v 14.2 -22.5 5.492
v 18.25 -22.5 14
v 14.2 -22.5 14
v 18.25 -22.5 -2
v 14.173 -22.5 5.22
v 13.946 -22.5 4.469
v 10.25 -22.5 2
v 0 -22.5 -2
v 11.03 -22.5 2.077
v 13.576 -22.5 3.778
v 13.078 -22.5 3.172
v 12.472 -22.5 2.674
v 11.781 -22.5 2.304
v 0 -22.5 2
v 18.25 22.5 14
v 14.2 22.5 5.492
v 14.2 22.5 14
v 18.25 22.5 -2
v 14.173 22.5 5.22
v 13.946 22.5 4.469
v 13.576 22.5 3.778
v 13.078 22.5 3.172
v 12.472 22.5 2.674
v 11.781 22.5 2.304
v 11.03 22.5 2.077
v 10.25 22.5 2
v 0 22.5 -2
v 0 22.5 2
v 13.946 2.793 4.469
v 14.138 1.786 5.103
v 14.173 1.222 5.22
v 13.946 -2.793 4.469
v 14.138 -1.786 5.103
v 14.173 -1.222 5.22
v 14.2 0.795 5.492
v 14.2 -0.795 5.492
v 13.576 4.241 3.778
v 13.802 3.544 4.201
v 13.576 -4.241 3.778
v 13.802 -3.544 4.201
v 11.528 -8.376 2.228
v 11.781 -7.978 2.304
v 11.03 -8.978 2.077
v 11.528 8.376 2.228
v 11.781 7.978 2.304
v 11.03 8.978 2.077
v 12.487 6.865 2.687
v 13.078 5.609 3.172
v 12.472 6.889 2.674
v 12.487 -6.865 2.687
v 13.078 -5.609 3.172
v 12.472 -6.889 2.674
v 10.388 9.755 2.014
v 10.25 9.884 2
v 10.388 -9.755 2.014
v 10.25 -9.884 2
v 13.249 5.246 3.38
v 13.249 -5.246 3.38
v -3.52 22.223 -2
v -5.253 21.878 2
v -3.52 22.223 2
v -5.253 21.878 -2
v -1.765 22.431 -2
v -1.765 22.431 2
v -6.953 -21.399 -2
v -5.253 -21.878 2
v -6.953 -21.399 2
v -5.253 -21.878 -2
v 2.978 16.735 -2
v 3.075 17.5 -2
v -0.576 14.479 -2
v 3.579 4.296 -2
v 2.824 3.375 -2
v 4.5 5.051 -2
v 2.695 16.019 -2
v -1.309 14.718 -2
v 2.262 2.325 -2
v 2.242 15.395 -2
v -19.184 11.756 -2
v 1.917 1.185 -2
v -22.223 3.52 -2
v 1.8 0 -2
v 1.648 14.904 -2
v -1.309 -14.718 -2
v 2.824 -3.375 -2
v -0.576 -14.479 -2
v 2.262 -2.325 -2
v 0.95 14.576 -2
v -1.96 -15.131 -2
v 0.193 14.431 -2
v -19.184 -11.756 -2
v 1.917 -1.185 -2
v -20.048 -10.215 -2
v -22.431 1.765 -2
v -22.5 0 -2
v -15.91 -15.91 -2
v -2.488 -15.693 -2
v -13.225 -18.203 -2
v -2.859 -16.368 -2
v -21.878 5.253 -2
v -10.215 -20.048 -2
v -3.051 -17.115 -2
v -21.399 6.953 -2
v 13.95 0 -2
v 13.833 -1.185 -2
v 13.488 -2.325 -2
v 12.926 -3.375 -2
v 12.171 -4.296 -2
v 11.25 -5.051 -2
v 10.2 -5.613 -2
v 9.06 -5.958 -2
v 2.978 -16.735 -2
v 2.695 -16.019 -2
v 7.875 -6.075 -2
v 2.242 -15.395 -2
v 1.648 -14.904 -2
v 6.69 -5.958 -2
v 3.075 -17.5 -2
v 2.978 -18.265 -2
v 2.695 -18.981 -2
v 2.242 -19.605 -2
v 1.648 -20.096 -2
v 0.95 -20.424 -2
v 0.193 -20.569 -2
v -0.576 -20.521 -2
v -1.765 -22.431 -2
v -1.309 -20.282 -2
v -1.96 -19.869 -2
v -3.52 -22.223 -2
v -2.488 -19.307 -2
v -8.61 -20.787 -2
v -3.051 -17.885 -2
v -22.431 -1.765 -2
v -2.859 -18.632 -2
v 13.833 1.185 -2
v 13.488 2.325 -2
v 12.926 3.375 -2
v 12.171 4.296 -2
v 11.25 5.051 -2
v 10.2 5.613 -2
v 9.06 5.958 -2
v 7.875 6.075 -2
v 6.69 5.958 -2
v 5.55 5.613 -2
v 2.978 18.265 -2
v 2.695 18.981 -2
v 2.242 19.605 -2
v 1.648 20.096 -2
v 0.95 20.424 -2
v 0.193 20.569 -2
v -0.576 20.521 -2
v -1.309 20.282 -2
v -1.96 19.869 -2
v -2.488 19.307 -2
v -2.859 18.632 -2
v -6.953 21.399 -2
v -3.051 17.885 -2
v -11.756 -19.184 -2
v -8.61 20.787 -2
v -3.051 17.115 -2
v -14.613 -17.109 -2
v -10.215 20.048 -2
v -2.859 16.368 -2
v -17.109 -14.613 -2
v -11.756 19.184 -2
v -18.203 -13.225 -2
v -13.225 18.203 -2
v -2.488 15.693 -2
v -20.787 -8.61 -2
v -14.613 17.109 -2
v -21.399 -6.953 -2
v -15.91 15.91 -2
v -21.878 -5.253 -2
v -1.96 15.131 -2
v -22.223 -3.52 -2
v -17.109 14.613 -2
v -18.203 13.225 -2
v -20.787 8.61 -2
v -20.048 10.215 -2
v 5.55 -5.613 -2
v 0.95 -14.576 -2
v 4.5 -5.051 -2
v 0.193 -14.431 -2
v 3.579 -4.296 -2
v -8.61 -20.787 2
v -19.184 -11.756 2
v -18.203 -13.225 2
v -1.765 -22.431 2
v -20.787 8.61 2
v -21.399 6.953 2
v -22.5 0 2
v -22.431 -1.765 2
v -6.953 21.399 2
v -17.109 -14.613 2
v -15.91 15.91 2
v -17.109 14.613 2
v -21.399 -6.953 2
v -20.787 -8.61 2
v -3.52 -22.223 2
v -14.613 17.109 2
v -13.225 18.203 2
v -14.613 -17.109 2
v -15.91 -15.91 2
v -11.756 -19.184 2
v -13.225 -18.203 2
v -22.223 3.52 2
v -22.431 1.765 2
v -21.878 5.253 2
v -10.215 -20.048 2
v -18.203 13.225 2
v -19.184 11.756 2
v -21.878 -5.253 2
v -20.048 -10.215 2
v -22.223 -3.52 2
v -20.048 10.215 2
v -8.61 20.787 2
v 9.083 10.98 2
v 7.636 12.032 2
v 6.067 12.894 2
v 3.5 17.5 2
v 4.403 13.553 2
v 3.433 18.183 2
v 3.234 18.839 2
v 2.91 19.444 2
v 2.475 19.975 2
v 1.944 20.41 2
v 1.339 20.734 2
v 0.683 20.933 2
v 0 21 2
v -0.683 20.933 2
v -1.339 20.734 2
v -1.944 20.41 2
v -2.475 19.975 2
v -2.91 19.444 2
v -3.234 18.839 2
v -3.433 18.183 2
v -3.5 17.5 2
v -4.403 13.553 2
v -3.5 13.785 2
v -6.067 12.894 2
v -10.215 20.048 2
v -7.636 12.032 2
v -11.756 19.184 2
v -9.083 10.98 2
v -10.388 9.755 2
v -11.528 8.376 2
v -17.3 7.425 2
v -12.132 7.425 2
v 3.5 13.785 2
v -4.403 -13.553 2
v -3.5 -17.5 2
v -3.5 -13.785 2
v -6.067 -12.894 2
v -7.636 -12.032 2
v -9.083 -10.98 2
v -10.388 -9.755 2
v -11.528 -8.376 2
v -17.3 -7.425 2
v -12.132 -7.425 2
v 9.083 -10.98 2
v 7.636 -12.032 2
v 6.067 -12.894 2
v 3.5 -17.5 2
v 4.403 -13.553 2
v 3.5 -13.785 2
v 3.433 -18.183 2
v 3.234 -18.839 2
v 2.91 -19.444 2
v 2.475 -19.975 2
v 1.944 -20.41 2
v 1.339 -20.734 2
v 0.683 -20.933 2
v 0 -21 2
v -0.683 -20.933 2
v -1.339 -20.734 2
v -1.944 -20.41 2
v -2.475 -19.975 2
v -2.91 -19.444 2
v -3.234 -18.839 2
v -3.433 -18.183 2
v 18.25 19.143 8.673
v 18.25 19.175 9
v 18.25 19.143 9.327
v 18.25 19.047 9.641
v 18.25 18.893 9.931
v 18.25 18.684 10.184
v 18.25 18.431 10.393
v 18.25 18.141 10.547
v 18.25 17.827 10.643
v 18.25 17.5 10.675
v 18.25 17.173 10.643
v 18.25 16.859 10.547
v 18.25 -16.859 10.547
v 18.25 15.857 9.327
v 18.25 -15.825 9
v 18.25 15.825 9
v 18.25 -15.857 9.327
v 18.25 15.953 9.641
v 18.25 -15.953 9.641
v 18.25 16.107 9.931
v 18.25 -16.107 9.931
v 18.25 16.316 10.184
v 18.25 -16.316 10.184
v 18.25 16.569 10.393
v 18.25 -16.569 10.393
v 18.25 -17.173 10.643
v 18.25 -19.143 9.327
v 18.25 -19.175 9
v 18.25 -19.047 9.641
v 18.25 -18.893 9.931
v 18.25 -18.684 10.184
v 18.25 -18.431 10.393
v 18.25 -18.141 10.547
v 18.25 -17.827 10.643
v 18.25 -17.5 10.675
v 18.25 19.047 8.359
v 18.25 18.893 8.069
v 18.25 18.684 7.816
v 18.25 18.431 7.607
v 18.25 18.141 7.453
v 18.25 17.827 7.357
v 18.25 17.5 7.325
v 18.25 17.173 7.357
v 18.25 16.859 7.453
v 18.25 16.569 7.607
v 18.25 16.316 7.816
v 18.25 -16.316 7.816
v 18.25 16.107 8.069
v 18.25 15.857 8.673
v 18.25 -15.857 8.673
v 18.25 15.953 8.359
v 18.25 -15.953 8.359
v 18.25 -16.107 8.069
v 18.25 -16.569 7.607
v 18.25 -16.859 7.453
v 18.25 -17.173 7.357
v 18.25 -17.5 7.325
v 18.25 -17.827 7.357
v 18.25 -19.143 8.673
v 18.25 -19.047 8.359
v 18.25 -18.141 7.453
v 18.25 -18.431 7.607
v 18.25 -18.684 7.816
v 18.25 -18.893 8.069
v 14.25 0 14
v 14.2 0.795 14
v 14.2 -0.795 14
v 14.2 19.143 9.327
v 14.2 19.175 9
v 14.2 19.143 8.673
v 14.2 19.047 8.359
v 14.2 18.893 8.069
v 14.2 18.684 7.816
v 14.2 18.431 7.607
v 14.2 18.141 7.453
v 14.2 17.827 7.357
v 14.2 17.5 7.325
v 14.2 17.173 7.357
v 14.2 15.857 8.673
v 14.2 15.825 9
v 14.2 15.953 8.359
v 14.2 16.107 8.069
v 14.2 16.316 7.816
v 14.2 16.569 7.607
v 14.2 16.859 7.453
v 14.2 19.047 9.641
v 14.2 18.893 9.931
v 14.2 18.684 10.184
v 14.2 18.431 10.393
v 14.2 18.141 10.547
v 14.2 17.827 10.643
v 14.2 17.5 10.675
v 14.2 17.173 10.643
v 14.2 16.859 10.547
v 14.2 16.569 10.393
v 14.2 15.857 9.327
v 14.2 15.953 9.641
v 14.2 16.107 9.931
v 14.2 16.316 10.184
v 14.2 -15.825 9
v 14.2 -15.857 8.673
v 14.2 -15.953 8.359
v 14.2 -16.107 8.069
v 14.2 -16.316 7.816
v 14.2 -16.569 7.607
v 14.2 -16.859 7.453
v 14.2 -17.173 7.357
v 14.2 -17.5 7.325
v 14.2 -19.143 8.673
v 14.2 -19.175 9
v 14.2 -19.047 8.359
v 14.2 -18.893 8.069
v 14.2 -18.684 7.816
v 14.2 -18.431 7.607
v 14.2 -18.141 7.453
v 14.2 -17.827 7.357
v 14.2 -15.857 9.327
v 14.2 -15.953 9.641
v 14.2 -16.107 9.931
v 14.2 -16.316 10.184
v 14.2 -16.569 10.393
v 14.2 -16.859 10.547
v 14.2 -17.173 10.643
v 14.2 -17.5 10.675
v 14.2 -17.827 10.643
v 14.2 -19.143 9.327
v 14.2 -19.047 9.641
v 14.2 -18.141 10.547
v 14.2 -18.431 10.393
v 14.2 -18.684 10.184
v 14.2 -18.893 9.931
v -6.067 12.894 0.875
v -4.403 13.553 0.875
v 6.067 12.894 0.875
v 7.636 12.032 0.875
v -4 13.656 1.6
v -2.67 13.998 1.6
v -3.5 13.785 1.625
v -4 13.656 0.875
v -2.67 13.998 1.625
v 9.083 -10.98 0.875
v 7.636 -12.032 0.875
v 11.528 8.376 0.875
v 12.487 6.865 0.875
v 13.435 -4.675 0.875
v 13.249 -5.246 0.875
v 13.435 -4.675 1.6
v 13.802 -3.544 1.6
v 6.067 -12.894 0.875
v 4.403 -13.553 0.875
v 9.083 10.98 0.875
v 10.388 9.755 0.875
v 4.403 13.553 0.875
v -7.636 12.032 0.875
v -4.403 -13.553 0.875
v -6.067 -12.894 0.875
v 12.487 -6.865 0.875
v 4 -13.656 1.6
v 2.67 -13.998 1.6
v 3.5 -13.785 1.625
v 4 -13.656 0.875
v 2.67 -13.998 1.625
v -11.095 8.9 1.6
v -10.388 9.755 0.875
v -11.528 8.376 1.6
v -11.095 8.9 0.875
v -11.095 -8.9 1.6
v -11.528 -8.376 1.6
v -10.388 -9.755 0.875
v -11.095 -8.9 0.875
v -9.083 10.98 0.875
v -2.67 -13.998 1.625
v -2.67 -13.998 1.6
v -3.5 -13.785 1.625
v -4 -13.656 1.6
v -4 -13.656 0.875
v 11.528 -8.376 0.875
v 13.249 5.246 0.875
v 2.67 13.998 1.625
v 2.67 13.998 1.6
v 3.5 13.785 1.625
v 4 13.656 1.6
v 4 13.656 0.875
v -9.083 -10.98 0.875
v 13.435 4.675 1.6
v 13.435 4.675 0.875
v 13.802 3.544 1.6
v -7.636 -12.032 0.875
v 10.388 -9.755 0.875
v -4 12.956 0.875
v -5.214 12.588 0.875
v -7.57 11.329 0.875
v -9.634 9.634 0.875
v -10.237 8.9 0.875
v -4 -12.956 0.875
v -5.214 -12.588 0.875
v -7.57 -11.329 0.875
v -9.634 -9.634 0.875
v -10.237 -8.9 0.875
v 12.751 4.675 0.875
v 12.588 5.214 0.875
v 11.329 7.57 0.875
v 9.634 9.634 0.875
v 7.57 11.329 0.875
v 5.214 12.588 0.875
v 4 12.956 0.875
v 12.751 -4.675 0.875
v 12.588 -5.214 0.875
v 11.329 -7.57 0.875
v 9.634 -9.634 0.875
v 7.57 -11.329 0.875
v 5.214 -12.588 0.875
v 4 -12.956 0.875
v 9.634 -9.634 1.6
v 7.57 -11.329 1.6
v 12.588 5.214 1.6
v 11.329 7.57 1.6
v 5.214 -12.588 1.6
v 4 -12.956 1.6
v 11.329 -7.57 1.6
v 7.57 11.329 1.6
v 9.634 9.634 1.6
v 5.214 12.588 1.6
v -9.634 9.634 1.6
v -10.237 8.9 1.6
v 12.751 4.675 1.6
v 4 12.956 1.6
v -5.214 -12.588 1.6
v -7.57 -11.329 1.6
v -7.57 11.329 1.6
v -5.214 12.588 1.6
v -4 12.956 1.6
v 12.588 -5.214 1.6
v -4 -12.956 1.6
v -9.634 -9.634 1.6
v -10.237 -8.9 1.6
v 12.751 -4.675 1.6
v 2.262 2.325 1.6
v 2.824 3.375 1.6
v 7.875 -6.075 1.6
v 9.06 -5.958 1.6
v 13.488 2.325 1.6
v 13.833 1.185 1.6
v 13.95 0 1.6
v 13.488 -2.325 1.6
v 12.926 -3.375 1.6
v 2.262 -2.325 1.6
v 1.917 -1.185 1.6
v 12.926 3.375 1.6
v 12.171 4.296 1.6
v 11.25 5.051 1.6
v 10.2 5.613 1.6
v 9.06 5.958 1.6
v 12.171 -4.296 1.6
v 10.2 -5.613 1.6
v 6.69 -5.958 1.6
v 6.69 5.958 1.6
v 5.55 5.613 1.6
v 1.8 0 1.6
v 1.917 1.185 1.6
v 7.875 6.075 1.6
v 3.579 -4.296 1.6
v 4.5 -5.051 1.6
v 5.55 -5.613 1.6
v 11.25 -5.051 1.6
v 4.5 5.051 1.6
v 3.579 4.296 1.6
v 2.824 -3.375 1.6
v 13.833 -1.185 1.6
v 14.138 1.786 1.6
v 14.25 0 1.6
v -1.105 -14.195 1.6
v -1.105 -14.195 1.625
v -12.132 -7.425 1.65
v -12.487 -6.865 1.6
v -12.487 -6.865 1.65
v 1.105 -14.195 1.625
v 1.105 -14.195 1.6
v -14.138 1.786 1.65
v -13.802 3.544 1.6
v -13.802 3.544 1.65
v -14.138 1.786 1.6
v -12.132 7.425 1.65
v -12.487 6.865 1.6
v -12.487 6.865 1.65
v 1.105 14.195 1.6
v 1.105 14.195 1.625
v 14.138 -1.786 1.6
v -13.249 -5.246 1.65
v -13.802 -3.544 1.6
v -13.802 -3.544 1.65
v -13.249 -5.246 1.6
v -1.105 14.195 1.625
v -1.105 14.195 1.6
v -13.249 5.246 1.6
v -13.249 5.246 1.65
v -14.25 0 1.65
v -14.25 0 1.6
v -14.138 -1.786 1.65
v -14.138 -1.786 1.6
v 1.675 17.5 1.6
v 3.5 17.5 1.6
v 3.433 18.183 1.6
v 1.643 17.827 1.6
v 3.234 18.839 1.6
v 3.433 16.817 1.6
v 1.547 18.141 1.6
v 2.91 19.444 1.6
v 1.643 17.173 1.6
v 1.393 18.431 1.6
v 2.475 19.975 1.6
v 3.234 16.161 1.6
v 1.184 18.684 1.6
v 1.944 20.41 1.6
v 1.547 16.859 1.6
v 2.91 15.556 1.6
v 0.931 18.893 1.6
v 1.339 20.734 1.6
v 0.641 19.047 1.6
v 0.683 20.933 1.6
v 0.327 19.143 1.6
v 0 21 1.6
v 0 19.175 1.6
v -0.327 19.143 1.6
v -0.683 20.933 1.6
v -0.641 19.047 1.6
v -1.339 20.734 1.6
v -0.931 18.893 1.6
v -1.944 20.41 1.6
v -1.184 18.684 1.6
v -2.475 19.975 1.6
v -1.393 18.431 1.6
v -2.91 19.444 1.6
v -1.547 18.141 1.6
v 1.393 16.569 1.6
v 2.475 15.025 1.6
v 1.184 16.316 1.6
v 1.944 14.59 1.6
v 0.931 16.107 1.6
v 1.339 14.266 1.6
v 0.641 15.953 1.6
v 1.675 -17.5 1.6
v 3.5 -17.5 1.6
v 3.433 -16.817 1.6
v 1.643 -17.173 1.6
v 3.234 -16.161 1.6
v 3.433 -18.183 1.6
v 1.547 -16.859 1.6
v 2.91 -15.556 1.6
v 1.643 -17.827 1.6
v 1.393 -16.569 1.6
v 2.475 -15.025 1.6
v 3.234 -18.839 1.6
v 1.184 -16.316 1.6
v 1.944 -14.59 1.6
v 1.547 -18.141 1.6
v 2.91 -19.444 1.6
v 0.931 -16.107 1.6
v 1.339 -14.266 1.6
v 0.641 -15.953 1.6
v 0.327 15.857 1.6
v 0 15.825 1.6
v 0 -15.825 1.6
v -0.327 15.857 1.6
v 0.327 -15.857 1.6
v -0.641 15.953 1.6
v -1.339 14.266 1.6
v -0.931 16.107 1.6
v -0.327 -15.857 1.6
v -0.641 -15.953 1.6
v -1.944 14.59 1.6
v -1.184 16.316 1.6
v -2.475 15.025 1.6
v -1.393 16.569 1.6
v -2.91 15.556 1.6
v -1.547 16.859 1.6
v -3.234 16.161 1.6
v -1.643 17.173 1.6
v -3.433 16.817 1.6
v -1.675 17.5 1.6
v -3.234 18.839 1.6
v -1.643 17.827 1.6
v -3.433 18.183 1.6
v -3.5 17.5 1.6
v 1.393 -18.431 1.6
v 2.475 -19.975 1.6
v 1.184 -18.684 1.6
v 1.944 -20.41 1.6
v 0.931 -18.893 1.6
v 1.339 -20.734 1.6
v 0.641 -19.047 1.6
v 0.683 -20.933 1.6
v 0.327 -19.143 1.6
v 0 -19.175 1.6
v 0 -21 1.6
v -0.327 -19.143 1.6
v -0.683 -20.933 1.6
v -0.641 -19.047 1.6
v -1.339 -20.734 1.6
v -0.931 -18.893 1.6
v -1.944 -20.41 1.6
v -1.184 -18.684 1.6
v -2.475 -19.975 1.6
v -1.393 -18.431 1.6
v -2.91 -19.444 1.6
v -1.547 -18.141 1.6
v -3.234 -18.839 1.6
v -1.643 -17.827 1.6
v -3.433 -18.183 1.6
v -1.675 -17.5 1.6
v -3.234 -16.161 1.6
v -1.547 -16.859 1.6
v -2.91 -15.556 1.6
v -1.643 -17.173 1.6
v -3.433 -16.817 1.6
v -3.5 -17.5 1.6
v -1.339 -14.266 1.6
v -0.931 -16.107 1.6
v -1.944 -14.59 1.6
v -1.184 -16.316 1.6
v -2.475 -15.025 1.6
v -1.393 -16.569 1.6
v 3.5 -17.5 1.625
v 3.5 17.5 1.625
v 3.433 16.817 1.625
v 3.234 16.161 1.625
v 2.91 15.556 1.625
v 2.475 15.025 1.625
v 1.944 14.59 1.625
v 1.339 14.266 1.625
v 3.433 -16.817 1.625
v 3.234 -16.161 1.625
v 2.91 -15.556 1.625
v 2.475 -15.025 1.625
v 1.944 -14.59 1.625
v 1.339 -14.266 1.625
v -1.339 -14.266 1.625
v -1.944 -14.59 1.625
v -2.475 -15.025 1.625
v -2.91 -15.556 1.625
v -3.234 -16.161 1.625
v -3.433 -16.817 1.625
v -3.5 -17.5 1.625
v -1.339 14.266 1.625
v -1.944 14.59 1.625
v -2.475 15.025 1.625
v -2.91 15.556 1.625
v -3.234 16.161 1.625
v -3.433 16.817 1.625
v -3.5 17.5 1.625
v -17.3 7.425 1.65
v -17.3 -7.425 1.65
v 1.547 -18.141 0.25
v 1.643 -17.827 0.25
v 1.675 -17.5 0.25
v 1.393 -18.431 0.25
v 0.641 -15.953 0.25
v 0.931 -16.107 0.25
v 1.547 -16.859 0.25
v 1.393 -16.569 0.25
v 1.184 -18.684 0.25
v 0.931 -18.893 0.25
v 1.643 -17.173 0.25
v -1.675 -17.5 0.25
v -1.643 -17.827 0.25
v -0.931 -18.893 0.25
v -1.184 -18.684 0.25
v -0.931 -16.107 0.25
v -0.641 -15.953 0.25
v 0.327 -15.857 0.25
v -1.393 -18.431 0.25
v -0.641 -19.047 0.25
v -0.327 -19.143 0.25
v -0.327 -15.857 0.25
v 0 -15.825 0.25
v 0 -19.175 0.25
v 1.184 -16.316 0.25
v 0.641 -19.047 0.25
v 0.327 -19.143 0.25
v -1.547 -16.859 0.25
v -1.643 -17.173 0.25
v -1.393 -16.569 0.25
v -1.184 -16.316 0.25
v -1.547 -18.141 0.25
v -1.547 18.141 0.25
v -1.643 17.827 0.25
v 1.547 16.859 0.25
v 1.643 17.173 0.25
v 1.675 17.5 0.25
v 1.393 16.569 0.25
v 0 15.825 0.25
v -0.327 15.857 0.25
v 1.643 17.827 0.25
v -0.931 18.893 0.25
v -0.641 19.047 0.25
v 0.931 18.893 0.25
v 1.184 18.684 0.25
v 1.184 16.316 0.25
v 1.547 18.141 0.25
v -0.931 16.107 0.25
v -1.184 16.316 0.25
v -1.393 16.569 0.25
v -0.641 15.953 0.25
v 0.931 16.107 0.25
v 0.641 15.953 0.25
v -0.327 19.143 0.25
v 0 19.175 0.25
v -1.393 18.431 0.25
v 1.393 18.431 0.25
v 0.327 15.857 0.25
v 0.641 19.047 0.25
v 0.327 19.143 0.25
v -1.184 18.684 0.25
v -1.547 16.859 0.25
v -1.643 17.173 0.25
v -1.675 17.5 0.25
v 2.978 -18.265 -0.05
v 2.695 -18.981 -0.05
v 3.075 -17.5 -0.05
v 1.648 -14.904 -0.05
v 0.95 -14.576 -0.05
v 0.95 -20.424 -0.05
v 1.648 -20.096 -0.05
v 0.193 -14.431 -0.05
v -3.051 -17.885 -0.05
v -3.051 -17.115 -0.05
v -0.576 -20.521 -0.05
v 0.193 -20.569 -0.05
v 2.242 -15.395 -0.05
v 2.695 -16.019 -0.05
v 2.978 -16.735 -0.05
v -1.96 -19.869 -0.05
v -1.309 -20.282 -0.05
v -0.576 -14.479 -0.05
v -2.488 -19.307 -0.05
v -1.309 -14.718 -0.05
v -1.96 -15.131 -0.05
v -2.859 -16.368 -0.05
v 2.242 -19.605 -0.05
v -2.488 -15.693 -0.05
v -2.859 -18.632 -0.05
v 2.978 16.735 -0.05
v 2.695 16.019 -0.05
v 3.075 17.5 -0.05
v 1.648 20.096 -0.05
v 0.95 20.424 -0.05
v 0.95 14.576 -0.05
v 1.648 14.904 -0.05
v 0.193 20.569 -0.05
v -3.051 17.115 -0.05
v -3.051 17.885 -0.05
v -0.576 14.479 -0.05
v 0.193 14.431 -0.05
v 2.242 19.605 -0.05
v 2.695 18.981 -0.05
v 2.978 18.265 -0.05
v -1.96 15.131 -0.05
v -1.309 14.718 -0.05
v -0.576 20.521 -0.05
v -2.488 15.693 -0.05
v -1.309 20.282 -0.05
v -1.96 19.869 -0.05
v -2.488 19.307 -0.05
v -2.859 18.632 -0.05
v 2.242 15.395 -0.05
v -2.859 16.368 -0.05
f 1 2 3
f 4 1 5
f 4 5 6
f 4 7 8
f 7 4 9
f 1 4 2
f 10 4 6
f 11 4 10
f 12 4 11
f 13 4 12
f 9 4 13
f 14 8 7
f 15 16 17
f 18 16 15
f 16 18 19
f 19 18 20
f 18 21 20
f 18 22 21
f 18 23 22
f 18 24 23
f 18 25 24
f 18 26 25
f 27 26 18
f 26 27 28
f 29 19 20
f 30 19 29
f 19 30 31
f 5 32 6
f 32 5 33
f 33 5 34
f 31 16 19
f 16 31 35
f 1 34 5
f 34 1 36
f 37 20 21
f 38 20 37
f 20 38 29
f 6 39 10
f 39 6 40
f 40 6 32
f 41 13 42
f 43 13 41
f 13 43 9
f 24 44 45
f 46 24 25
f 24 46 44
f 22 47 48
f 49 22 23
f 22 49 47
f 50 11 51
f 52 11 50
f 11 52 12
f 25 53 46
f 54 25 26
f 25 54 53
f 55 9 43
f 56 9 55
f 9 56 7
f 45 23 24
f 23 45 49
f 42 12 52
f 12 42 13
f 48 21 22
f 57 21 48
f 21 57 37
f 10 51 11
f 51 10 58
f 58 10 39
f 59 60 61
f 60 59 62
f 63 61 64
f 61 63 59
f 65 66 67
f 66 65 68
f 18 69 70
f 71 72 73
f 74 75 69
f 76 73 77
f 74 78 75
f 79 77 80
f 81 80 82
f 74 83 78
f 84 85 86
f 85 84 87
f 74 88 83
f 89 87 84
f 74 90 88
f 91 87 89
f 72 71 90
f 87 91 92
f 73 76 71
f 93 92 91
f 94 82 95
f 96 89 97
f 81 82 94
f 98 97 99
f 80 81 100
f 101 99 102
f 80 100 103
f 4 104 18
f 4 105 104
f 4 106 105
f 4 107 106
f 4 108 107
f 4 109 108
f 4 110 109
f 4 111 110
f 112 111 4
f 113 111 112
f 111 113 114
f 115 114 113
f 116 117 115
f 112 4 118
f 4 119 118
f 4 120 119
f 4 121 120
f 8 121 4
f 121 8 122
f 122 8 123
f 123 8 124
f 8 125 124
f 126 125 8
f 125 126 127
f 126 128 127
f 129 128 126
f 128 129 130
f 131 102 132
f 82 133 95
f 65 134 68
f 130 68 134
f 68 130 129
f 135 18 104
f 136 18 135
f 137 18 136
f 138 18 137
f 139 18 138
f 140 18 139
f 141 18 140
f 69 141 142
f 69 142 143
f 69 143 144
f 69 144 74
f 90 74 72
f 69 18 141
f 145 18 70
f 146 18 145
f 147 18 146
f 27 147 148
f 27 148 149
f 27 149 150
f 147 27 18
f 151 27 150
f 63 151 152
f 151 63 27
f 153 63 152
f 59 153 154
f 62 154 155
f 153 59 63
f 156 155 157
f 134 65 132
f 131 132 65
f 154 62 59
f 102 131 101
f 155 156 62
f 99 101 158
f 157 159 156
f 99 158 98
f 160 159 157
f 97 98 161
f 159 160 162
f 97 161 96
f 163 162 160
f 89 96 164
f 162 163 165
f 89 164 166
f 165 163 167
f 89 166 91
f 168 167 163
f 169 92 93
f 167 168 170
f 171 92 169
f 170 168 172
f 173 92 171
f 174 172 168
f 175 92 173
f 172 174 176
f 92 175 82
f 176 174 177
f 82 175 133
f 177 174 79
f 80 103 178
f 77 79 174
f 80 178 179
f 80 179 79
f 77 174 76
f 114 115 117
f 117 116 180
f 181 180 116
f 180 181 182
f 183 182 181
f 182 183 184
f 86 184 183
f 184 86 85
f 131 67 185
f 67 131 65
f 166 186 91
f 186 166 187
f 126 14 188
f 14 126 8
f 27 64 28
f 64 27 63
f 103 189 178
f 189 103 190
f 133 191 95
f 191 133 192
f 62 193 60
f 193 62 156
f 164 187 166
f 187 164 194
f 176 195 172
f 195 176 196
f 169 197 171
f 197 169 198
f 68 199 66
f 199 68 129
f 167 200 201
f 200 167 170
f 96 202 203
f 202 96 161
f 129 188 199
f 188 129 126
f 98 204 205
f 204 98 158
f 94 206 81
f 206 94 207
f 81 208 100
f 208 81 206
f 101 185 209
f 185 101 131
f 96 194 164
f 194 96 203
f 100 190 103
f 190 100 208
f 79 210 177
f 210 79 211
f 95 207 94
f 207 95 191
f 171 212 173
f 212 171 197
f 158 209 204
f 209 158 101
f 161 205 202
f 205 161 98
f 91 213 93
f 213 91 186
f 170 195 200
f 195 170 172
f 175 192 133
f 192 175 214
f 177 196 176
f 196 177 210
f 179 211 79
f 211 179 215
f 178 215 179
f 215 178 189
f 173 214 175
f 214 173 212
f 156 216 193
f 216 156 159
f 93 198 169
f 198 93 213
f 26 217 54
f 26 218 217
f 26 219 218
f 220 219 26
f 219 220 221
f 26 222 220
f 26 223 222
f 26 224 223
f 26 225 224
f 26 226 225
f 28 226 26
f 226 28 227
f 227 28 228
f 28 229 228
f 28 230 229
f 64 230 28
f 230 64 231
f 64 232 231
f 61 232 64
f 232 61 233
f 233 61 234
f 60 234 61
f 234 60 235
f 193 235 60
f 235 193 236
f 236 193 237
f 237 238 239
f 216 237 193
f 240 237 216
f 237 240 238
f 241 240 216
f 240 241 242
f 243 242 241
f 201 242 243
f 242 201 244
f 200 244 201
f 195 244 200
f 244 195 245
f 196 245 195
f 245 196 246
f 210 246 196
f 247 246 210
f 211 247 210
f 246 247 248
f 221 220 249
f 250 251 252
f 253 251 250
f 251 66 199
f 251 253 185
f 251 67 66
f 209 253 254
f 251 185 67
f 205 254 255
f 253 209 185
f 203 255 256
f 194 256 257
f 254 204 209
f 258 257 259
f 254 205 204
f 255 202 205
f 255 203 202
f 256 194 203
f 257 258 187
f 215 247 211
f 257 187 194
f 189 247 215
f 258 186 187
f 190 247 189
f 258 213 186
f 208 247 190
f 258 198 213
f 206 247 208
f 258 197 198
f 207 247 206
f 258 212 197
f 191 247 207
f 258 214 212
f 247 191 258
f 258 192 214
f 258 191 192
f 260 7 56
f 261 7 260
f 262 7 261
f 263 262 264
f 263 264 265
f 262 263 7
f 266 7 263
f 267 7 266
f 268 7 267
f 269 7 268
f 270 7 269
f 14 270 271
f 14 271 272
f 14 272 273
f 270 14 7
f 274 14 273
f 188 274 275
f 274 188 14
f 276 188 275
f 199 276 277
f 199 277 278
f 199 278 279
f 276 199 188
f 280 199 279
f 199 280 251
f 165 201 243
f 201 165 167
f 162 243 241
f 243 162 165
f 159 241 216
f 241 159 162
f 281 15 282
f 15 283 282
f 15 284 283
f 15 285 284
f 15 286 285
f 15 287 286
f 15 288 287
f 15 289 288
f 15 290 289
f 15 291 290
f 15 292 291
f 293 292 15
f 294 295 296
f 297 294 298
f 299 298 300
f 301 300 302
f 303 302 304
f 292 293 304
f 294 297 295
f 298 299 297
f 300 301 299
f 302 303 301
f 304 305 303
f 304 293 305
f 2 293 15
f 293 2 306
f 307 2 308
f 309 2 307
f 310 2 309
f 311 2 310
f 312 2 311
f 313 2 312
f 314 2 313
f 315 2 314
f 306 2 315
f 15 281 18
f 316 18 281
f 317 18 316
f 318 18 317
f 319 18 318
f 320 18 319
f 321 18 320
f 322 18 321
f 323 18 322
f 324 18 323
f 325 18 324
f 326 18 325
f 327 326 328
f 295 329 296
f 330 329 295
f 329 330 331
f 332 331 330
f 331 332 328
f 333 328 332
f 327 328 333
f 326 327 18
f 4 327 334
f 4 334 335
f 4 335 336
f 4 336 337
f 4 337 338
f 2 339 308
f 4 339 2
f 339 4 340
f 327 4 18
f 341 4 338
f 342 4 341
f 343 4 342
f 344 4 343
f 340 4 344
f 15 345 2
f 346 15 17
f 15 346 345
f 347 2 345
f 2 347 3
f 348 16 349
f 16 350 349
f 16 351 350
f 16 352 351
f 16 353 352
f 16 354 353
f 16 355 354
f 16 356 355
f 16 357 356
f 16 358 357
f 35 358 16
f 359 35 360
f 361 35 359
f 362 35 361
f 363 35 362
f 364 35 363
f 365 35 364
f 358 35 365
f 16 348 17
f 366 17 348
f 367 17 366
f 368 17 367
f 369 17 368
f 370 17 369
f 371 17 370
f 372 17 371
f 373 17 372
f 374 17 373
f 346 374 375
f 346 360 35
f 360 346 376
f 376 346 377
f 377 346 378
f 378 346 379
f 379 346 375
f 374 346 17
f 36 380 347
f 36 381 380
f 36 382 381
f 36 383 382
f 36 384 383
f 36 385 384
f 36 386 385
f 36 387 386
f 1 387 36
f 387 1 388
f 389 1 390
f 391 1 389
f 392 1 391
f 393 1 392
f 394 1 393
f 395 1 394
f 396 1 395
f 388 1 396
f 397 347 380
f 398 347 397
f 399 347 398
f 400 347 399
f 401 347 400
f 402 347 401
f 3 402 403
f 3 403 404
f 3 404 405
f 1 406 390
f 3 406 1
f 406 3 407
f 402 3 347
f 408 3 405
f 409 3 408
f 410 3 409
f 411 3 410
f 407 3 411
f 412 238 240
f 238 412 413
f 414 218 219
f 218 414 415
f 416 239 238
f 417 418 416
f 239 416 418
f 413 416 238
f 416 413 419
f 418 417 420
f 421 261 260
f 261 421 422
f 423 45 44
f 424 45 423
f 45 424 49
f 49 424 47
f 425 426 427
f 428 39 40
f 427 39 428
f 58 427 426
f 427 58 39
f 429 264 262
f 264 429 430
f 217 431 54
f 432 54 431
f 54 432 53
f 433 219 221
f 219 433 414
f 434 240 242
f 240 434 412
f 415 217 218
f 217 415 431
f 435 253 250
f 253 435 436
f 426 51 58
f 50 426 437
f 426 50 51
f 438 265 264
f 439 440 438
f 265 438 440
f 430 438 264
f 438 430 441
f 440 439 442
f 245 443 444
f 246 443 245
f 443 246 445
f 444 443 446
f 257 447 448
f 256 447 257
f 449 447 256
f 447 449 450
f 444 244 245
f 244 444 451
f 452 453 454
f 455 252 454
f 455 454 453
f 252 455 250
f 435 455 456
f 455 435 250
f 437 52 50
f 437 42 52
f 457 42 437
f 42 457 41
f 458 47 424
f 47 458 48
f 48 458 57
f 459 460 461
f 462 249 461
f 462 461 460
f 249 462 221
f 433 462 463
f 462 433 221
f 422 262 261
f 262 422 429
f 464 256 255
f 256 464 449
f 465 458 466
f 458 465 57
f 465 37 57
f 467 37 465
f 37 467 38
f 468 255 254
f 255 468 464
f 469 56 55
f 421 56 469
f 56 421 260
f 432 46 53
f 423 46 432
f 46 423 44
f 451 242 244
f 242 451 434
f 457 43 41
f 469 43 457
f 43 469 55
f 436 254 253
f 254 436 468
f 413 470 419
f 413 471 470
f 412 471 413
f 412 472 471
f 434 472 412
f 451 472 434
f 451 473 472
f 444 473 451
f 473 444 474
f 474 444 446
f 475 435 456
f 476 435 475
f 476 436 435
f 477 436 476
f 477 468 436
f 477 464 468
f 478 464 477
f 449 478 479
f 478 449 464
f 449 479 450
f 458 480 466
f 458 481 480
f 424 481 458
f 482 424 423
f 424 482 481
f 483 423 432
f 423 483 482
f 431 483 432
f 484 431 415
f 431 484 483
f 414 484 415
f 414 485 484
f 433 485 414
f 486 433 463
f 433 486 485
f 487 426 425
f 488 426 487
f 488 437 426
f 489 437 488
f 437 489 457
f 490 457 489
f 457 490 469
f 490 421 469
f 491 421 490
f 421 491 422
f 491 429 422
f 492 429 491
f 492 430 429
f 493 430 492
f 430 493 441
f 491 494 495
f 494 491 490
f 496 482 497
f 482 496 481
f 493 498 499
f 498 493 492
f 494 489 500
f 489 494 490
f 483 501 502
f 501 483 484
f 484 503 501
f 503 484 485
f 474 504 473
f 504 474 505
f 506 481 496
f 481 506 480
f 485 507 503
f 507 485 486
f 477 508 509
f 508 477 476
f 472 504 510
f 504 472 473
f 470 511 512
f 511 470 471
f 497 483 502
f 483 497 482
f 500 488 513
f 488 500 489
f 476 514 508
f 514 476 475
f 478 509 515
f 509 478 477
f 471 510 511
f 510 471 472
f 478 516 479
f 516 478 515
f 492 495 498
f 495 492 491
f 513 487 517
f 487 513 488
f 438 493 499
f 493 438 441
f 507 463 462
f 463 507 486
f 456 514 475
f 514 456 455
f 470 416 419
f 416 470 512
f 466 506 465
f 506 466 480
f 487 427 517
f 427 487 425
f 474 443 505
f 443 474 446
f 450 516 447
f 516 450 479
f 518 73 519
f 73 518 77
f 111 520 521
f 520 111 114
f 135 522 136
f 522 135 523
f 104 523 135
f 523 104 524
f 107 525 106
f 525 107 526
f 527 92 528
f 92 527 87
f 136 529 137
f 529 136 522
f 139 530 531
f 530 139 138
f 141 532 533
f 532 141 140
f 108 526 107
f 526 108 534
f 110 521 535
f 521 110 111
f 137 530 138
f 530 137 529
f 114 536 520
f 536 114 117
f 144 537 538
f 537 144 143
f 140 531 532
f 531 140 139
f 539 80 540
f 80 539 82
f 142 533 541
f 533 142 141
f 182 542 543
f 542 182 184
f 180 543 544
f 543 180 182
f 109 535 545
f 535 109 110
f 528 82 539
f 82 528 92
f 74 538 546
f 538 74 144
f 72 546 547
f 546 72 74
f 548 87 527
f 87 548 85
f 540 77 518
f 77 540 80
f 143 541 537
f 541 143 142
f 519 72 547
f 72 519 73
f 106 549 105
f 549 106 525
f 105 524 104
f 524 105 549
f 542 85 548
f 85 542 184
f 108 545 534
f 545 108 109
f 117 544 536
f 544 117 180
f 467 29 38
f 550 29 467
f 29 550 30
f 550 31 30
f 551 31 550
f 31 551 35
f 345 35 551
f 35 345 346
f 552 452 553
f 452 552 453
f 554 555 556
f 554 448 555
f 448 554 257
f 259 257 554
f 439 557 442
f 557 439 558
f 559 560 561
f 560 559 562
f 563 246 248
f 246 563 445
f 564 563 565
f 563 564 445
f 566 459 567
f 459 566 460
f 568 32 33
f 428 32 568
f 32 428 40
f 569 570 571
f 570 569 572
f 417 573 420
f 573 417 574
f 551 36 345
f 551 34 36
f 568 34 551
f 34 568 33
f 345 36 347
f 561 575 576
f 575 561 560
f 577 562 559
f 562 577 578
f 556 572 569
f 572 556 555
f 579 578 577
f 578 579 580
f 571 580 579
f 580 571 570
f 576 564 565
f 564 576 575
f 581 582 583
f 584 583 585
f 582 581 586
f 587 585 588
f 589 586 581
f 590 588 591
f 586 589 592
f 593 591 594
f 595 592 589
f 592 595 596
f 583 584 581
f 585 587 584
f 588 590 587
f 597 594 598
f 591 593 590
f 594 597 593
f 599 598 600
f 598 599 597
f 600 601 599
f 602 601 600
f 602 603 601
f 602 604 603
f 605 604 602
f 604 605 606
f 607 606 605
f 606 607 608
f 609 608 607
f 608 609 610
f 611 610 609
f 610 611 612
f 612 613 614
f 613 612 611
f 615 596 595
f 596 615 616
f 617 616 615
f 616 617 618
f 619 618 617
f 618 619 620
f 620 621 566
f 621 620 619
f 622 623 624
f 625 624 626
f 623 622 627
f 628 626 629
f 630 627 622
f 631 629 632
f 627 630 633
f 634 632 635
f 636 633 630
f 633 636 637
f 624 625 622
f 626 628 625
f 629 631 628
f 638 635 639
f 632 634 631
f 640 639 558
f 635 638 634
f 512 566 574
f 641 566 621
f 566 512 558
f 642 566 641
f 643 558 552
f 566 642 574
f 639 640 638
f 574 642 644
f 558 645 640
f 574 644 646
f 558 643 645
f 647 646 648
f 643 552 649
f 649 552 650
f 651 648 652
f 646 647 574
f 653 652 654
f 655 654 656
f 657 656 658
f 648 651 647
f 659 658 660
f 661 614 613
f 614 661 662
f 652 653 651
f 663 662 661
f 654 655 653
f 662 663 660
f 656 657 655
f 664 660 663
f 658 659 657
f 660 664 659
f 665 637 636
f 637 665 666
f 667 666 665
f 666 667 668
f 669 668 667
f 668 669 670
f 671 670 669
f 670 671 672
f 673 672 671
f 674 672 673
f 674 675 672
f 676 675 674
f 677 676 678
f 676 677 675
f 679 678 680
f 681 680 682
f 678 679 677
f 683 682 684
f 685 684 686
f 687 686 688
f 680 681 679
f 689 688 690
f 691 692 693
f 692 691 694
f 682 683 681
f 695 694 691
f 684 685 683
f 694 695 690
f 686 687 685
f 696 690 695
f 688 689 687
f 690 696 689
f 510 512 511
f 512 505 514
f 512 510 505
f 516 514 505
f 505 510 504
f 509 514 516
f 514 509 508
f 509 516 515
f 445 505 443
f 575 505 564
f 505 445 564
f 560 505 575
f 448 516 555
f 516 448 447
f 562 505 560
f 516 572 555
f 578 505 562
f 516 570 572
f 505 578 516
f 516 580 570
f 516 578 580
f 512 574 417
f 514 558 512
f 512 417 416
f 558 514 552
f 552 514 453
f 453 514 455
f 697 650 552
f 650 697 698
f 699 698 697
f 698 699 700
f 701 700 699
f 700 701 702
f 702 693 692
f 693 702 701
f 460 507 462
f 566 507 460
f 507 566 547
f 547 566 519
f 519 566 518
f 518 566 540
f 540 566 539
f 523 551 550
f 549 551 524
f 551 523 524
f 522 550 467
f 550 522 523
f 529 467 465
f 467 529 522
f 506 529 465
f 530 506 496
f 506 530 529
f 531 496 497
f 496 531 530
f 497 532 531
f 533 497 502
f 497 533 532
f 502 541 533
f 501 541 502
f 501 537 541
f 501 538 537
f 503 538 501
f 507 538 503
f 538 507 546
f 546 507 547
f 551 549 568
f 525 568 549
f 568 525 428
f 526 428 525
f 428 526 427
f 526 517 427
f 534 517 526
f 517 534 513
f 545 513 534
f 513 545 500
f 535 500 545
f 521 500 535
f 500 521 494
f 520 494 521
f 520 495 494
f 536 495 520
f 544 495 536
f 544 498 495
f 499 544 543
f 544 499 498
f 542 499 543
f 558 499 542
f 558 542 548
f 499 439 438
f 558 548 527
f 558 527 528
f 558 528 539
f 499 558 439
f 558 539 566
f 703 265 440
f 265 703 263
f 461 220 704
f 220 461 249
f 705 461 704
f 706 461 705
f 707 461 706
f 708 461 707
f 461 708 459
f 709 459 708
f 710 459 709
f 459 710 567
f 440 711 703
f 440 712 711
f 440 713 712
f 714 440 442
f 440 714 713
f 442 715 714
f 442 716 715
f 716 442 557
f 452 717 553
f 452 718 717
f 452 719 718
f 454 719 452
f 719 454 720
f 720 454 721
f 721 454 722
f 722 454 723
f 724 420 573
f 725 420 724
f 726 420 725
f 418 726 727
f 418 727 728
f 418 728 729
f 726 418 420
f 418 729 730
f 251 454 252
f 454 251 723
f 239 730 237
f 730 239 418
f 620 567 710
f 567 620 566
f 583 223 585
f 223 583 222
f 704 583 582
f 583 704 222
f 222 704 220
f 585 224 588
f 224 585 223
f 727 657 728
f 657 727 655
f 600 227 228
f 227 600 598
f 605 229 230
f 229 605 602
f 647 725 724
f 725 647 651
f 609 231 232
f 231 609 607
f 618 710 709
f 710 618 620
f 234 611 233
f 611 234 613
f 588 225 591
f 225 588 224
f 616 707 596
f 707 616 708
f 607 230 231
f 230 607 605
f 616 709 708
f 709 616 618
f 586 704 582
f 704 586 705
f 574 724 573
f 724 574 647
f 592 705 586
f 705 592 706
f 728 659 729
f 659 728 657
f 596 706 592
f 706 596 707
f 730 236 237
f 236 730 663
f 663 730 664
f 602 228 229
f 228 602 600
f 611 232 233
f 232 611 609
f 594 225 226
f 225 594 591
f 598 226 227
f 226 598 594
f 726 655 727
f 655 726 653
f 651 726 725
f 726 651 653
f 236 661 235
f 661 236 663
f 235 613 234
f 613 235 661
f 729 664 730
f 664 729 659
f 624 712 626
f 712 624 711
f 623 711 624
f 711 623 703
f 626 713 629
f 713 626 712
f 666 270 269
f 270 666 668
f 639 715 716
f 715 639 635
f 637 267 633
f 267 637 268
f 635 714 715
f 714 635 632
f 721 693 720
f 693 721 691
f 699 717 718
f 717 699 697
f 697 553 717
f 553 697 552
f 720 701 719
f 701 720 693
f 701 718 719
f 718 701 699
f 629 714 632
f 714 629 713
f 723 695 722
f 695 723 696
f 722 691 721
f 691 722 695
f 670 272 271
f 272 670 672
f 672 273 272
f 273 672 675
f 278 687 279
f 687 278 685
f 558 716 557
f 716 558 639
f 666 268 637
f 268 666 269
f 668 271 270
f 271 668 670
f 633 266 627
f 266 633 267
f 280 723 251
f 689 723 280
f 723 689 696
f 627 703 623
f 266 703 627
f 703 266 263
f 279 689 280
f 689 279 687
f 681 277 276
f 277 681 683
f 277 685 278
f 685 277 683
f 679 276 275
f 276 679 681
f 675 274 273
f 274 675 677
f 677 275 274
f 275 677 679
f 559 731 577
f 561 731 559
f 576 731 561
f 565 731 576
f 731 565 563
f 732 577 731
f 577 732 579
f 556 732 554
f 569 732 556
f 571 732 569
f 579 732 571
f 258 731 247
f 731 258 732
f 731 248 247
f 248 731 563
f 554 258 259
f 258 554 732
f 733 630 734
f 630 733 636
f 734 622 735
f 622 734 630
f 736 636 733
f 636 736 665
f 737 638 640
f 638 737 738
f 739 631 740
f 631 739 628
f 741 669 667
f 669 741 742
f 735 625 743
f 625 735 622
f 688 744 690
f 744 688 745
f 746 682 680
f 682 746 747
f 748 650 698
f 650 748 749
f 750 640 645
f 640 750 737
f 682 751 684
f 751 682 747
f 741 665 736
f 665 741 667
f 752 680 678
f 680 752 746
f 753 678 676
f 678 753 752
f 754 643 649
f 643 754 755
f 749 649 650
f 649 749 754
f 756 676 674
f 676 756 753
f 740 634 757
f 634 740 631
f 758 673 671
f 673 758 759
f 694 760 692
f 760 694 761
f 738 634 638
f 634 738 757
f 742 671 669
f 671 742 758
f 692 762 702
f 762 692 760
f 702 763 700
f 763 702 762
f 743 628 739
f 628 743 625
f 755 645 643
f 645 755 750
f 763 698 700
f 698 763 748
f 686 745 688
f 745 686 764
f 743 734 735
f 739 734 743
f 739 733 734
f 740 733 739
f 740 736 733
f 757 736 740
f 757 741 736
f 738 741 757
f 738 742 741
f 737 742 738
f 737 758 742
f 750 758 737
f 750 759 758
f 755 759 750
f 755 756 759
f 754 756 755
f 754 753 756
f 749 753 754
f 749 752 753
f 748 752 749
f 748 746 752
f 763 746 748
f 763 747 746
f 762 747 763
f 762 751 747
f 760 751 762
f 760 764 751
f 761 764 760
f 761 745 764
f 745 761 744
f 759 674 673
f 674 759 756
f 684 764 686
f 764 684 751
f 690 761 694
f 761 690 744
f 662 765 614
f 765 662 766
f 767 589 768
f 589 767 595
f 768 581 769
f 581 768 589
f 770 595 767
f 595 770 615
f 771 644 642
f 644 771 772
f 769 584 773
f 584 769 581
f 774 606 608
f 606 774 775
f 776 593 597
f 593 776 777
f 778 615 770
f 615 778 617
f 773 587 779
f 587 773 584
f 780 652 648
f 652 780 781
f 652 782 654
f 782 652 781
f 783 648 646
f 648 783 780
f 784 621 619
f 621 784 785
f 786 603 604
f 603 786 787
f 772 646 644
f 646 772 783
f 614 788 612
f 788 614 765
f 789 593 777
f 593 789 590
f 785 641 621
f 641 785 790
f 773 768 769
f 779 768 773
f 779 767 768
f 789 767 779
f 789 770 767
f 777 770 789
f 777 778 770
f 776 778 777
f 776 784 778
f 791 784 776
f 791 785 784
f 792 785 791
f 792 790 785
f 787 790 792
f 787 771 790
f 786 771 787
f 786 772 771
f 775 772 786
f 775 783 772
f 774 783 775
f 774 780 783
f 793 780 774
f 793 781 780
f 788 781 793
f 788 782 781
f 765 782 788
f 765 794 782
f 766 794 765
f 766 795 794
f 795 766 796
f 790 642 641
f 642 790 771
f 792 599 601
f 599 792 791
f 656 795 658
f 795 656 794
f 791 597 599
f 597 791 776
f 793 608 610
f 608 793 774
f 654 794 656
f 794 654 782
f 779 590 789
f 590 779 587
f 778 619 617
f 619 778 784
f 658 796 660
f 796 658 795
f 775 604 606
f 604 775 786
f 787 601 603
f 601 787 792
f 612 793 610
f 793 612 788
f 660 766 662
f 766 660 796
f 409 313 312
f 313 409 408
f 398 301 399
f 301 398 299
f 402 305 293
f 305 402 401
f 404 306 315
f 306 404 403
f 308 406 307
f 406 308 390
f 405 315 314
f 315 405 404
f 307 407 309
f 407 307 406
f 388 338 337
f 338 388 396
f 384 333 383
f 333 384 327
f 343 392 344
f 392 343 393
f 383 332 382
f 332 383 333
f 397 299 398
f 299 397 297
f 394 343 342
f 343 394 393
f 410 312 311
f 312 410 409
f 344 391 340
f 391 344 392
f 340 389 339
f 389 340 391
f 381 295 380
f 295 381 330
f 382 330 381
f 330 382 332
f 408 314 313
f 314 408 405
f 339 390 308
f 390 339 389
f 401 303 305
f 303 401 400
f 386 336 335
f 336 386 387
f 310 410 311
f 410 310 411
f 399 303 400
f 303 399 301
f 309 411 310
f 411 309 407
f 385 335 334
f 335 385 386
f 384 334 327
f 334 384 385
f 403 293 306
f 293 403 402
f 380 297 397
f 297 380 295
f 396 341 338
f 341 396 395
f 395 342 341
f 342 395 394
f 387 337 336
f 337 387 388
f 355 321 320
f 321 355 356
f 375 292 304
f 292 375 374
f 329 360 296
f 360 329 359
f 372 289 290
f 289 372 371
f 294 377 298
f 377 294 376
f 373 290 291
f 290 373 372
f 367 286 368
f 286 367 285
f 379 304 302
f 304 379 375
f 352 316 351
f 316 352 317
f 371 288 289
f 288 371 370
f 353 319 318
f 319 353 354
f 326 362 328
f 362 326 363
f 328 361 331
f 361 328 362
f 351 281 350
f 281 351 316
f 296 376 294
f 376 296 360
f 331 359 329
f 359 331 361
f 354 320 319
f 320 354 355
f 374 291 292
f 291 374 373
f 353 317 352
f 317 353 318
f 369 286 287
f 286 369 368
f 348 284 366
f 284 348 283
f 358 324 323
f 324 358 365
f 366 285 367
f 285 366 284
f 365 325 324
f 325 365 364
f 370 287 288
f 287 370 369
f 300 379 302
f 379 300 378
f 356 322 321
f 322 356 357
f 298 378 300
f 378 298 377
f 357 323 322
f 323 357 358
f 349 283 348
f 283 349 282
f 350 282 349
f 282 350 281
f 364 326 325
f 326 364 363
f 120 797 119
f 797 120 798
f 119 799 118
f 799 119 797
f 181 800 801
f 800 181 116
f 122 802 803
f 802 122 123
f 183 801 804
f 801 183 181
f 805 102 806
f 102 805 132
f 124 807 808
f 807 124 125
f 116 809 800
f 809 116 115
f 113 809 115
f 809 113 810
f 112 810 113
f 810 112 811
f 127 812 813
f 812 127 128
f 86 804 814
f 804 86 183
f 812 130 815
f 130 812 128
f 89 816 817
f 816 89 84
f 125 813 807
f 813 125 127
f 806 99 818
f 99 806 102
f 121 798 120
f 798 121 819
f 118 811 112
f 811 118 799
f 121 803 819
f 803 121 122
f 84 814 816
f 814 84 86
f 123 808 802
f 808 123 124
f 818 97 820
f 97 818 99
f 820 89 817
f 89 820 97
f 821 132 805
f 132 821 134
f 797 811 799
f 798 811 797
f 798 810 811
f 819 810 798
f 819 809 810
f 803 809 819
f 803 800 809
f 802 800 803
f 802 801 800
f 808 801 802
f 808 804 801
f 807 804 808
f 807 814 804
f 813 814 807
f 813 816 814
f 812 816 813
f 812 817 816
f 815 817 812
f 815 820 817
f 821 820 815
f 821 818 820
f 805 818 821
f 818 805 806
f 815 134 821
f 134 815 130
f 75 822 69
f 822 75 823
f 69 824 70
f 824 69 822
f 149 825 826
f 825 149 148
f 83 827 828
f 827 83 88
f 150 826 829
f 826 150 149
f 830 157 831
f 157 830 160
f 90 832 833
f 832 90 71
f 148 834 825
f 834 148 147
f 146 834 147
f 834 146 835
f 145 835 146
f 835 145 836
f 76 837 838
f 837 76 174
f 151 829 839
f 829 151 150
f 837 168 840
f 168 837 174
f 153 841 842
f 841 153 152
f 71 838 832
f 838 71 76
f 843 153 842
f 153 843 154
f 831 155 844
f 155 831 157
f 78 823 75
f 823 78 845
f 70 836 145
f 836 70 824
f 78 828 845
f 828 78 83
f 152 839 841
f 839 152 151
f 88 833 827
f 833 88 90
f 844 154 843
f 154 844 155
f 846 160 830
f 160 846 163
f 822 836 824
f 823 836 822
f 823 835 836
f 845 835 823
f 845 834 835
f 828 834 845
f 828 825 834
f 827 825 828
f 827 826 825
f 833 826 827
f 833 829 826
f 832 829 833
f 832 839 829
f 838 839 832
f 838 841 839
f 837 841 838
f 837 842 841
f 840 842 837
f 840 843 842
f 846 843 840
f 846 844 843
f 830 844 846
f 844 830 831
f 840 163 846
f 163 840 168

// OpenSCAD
// Bracket for  28BYJ-48 stepper motor
// 28BYJ-48 model from RGriffoGoes www.thingiverse.com/thing:204734
// added details by J.Beale 21 July 2014
// Bracket by J.Beale 9 Aug 2014

slop = 0.25;  // printer tolerance
layer = 0.25; // layer height

// =========================================================
// stepper motor body model

MBH = 18.8;   // motor body height
MBD = 28.25+slop;  // motor body OD
SBD = 9.1+slop;    // shaft boss OD
SBH = 1.45;   // shaft boss height above motor body
SBO = 7.875;  // offset of shaft/boss center from motor center
//SHD = 4.93+slop*2;   // motor shaft OD+ countersink for boss
SHD = 11.9+slop;   // motor shaft OD (larger clearance hole)
SHDF = 3.0;   // motor shaft diameter, across flats
SHHF = 6.0;   // motor shaft flats height, or depth in from end
SHHF = 0.0;   // assume round shaft for purposes of bracket
SHH = 9.75;   // height of shaft above motor body 

MBFH = 0.7;   // height of body edge flange protruding above surface
MBFW = 1.0+slop;   // width of edge flange
MBFNW = 8;    // width of notch in edge flange
MBFNW2 = 17.8;  // width of edge flange notch above wiring box

MHCC = 35.0;  // mounting hole center-to-center
MTH  = 0.8;   // mounting tab thickness
MTW  = 7.0;   // mounting tab width
// MTHID = 4.0;  // mounting tab hole inner diameter
MTHID = 3.0;  // mounting tab hole inner diameter
WBH  = 16.7;  // plastic wiring box height
WBW  = 14.6+slop;  // plastic wiring box width
WBD  = 31.3+slop;  // body diameter to outer surface of wiring box

WRD = 1.0;     // diameter of electrical wires
WRL = 30;      // length of electrical wires
WRO = 2.2;		// offset of wires below top motor surface
// =========================================================
// right-angle bracket for motor

MSOD = 5.9 + slop;  // M3 mounting screw head diameter
MSTH = 2.0;  // M3 screw head thickness (for countersink)
//MSTH = 0; // set to zero for no screwhead countersink
MSSD = 3.1 + slop;  // M3 screw diameter clearance hole
Bthick = 4;  // thickness of bracket
Bdia = (MHCC+10);  // diameter of bracket face

// =========================================================
fn = 80;
eps = 0.05;   // small number to avoid coincident faces


module StepMotor28BYJ()
{
  difference(){
    union(){
	   color("gray") translate([0,0,-(MBH+MBFH)/2])
		  difference() {  // flange at top rim
         cylinder(h = MBFH+eps, r = MBD/2, center = true, $fn = 50);
         cylinder(h = MBFH+2*eps, r = (MBD-MBFW)/2, center = true, $fn = 32);
			cube([MBFNW,MHCC,MBFH*2],center=true); // notches in rim
			cube([MBD+2*MBFW,SBD,MBFH*2],center=true);
		   translate([-MBD/2,0,0]) cube([MBD,MBFNW2,MBFH*2],center=true);
        }
		color("gray") // motor body
			cylinder(h = MBH, r = MBD/2, center = true, $fn = 50);
		color("gray") translate([SBO,0,-SBH])	// shaft boss
			cylinder(h = MBH, r = SBD/2, center = true, $fn = 32);

		translate([SBO,0,-SHH])	// motor shaft
        difference() {
			color("gold") cylinder(h = MBH, r = SHD/2, center = true, $fn = 32);
				// shaft flats
		   color("red") translate([(SHD+SHDF)/2,0,-(eps+MBH-SHHF)/2]) 
				cube([SHD,SHD,SHHF], center = true);
		   color("red") translate([-(SHD+SHDF)/2,0,-(eps+MBH-SHHF)/2]) 
				cube([SHD,SHD,SHHF], center = true);
        }


		color("Silver") translate([0,0,-(MBH-MTH-eps)/2]) // mounting tab 
			cube([MTW,MHCC,MTH], center = true);				
		color("Silver") translate([0,MHCC/2,-(MBH-MTH)/2]) // mt.tab rounded end
			cylinder(h = MTH, r = MTW/2, center = true, $fn = 32);
		color("Silver") translate([0,-MHCC/2,-(MBH-MTH)/2]) // mt.tab rounded end
			cylinder(h = MTH, r = MTW/2, center = true, $fn = 32);


		color("blue") translate([-(WBD-MBD),0,eps-(MBH-WBH)/2]) // plastic wire box
			cube([MBD,WBW,WBH], center = true);
	   color("blue") translate([-2,0,0])	
			cube([24.5,16,15], center = true);
		}

				// mounting holes in tabs on side
		color("red") translate([0,MHCC/2,-MBH/2])	
				cylinder(h = 2, r = MTHID/2, center = true, $fn = 32);
		color("red") translate([0,-MHCC/2,-MBH/2])	
				cylinder(h = 2, r = MTHID/2, center = true, $fn = 32);
		}
}

module MOT() {
 translate([0,0,-MBH/2]) 
 rotate([180,0,0]) StepMotor28BYJ();  // motor body (without wires)
}


module bracket() {
difference() {
 union() {
  translate([0,0,-2]) cylinder(h=Bthick, r=Bdia/2, $fn=fn);  // round face
  translate([-eps + MBD/2,-Bdia/2,-16+Bthick/2]) 
		cube([4+eps,Bdia,16]); // flange
  translate([-0,-Bdia/2,-Bthick/2]) 
	cube([Bdia,Bdia,Bthick]); // square edge joining round face to flange
  translate([MBD/2,Bdia/2,-Bthick/2]) rotate([90,0,0]) {
	difference(){cylinder(r=Bthick,h=Bdia,$fn=32); // round fillet at flange
   translate([-Bthick,-Bthick,0])cylinder(r=Bthick,h=Bdia,$fn=32); // round fillet at flange
}
}
 }
 union() {
   translate([4+MBD/2,-MBD,-MBD]) cube([MBD*2,MBD*2,MBD*2]);
   translate([0,MHCC/2,-15-layer])	// motor mounting bolt
				cylinder(h = 30, r = MSSD/2, center = true, $fn = 32);
   translate([0,-MHCC/2,-15-layer])	// motor mounting bole
				cylinder(h = 30, r = MSSD/2, center = true, $fn = 32);
   translate([10,MHCC/2,-10+1]) rotate([0,90,0]) 	// flange mounting bolt
				cylinder(h = 30, r = MSSD/2, center = true, $fn = 32);
   translate([10,-MHCC/2,-10+1]) rotate([0,90,0]) 	// flange mounting bolt
				cylinder(h = 30, r = MSSD/2, center = true, $fn = 32);

   color("white") translate([0,MHCC/2,((Bthick/2) - MSTH + eps)]) 
	 cylinder(r=MSOD/2, h=MSTH, $fn=25); // motor screw countersink
   color("white") translate([0,-MHCC/2,((Bthick/2) - MSTH + eps)])  
	 cylinder(r=MSOD/2, h=MSTH, $fn=25); // motor screw countersink

   translate([0,0,-1.6]) MOT(); // body of motor
   //translate([0,0,-10]) cube([50,50,50]); // DEBUG cutaway view
 }
}
} // end module()

rotate([180,0,0]) bracket();  // show the motor bracket
